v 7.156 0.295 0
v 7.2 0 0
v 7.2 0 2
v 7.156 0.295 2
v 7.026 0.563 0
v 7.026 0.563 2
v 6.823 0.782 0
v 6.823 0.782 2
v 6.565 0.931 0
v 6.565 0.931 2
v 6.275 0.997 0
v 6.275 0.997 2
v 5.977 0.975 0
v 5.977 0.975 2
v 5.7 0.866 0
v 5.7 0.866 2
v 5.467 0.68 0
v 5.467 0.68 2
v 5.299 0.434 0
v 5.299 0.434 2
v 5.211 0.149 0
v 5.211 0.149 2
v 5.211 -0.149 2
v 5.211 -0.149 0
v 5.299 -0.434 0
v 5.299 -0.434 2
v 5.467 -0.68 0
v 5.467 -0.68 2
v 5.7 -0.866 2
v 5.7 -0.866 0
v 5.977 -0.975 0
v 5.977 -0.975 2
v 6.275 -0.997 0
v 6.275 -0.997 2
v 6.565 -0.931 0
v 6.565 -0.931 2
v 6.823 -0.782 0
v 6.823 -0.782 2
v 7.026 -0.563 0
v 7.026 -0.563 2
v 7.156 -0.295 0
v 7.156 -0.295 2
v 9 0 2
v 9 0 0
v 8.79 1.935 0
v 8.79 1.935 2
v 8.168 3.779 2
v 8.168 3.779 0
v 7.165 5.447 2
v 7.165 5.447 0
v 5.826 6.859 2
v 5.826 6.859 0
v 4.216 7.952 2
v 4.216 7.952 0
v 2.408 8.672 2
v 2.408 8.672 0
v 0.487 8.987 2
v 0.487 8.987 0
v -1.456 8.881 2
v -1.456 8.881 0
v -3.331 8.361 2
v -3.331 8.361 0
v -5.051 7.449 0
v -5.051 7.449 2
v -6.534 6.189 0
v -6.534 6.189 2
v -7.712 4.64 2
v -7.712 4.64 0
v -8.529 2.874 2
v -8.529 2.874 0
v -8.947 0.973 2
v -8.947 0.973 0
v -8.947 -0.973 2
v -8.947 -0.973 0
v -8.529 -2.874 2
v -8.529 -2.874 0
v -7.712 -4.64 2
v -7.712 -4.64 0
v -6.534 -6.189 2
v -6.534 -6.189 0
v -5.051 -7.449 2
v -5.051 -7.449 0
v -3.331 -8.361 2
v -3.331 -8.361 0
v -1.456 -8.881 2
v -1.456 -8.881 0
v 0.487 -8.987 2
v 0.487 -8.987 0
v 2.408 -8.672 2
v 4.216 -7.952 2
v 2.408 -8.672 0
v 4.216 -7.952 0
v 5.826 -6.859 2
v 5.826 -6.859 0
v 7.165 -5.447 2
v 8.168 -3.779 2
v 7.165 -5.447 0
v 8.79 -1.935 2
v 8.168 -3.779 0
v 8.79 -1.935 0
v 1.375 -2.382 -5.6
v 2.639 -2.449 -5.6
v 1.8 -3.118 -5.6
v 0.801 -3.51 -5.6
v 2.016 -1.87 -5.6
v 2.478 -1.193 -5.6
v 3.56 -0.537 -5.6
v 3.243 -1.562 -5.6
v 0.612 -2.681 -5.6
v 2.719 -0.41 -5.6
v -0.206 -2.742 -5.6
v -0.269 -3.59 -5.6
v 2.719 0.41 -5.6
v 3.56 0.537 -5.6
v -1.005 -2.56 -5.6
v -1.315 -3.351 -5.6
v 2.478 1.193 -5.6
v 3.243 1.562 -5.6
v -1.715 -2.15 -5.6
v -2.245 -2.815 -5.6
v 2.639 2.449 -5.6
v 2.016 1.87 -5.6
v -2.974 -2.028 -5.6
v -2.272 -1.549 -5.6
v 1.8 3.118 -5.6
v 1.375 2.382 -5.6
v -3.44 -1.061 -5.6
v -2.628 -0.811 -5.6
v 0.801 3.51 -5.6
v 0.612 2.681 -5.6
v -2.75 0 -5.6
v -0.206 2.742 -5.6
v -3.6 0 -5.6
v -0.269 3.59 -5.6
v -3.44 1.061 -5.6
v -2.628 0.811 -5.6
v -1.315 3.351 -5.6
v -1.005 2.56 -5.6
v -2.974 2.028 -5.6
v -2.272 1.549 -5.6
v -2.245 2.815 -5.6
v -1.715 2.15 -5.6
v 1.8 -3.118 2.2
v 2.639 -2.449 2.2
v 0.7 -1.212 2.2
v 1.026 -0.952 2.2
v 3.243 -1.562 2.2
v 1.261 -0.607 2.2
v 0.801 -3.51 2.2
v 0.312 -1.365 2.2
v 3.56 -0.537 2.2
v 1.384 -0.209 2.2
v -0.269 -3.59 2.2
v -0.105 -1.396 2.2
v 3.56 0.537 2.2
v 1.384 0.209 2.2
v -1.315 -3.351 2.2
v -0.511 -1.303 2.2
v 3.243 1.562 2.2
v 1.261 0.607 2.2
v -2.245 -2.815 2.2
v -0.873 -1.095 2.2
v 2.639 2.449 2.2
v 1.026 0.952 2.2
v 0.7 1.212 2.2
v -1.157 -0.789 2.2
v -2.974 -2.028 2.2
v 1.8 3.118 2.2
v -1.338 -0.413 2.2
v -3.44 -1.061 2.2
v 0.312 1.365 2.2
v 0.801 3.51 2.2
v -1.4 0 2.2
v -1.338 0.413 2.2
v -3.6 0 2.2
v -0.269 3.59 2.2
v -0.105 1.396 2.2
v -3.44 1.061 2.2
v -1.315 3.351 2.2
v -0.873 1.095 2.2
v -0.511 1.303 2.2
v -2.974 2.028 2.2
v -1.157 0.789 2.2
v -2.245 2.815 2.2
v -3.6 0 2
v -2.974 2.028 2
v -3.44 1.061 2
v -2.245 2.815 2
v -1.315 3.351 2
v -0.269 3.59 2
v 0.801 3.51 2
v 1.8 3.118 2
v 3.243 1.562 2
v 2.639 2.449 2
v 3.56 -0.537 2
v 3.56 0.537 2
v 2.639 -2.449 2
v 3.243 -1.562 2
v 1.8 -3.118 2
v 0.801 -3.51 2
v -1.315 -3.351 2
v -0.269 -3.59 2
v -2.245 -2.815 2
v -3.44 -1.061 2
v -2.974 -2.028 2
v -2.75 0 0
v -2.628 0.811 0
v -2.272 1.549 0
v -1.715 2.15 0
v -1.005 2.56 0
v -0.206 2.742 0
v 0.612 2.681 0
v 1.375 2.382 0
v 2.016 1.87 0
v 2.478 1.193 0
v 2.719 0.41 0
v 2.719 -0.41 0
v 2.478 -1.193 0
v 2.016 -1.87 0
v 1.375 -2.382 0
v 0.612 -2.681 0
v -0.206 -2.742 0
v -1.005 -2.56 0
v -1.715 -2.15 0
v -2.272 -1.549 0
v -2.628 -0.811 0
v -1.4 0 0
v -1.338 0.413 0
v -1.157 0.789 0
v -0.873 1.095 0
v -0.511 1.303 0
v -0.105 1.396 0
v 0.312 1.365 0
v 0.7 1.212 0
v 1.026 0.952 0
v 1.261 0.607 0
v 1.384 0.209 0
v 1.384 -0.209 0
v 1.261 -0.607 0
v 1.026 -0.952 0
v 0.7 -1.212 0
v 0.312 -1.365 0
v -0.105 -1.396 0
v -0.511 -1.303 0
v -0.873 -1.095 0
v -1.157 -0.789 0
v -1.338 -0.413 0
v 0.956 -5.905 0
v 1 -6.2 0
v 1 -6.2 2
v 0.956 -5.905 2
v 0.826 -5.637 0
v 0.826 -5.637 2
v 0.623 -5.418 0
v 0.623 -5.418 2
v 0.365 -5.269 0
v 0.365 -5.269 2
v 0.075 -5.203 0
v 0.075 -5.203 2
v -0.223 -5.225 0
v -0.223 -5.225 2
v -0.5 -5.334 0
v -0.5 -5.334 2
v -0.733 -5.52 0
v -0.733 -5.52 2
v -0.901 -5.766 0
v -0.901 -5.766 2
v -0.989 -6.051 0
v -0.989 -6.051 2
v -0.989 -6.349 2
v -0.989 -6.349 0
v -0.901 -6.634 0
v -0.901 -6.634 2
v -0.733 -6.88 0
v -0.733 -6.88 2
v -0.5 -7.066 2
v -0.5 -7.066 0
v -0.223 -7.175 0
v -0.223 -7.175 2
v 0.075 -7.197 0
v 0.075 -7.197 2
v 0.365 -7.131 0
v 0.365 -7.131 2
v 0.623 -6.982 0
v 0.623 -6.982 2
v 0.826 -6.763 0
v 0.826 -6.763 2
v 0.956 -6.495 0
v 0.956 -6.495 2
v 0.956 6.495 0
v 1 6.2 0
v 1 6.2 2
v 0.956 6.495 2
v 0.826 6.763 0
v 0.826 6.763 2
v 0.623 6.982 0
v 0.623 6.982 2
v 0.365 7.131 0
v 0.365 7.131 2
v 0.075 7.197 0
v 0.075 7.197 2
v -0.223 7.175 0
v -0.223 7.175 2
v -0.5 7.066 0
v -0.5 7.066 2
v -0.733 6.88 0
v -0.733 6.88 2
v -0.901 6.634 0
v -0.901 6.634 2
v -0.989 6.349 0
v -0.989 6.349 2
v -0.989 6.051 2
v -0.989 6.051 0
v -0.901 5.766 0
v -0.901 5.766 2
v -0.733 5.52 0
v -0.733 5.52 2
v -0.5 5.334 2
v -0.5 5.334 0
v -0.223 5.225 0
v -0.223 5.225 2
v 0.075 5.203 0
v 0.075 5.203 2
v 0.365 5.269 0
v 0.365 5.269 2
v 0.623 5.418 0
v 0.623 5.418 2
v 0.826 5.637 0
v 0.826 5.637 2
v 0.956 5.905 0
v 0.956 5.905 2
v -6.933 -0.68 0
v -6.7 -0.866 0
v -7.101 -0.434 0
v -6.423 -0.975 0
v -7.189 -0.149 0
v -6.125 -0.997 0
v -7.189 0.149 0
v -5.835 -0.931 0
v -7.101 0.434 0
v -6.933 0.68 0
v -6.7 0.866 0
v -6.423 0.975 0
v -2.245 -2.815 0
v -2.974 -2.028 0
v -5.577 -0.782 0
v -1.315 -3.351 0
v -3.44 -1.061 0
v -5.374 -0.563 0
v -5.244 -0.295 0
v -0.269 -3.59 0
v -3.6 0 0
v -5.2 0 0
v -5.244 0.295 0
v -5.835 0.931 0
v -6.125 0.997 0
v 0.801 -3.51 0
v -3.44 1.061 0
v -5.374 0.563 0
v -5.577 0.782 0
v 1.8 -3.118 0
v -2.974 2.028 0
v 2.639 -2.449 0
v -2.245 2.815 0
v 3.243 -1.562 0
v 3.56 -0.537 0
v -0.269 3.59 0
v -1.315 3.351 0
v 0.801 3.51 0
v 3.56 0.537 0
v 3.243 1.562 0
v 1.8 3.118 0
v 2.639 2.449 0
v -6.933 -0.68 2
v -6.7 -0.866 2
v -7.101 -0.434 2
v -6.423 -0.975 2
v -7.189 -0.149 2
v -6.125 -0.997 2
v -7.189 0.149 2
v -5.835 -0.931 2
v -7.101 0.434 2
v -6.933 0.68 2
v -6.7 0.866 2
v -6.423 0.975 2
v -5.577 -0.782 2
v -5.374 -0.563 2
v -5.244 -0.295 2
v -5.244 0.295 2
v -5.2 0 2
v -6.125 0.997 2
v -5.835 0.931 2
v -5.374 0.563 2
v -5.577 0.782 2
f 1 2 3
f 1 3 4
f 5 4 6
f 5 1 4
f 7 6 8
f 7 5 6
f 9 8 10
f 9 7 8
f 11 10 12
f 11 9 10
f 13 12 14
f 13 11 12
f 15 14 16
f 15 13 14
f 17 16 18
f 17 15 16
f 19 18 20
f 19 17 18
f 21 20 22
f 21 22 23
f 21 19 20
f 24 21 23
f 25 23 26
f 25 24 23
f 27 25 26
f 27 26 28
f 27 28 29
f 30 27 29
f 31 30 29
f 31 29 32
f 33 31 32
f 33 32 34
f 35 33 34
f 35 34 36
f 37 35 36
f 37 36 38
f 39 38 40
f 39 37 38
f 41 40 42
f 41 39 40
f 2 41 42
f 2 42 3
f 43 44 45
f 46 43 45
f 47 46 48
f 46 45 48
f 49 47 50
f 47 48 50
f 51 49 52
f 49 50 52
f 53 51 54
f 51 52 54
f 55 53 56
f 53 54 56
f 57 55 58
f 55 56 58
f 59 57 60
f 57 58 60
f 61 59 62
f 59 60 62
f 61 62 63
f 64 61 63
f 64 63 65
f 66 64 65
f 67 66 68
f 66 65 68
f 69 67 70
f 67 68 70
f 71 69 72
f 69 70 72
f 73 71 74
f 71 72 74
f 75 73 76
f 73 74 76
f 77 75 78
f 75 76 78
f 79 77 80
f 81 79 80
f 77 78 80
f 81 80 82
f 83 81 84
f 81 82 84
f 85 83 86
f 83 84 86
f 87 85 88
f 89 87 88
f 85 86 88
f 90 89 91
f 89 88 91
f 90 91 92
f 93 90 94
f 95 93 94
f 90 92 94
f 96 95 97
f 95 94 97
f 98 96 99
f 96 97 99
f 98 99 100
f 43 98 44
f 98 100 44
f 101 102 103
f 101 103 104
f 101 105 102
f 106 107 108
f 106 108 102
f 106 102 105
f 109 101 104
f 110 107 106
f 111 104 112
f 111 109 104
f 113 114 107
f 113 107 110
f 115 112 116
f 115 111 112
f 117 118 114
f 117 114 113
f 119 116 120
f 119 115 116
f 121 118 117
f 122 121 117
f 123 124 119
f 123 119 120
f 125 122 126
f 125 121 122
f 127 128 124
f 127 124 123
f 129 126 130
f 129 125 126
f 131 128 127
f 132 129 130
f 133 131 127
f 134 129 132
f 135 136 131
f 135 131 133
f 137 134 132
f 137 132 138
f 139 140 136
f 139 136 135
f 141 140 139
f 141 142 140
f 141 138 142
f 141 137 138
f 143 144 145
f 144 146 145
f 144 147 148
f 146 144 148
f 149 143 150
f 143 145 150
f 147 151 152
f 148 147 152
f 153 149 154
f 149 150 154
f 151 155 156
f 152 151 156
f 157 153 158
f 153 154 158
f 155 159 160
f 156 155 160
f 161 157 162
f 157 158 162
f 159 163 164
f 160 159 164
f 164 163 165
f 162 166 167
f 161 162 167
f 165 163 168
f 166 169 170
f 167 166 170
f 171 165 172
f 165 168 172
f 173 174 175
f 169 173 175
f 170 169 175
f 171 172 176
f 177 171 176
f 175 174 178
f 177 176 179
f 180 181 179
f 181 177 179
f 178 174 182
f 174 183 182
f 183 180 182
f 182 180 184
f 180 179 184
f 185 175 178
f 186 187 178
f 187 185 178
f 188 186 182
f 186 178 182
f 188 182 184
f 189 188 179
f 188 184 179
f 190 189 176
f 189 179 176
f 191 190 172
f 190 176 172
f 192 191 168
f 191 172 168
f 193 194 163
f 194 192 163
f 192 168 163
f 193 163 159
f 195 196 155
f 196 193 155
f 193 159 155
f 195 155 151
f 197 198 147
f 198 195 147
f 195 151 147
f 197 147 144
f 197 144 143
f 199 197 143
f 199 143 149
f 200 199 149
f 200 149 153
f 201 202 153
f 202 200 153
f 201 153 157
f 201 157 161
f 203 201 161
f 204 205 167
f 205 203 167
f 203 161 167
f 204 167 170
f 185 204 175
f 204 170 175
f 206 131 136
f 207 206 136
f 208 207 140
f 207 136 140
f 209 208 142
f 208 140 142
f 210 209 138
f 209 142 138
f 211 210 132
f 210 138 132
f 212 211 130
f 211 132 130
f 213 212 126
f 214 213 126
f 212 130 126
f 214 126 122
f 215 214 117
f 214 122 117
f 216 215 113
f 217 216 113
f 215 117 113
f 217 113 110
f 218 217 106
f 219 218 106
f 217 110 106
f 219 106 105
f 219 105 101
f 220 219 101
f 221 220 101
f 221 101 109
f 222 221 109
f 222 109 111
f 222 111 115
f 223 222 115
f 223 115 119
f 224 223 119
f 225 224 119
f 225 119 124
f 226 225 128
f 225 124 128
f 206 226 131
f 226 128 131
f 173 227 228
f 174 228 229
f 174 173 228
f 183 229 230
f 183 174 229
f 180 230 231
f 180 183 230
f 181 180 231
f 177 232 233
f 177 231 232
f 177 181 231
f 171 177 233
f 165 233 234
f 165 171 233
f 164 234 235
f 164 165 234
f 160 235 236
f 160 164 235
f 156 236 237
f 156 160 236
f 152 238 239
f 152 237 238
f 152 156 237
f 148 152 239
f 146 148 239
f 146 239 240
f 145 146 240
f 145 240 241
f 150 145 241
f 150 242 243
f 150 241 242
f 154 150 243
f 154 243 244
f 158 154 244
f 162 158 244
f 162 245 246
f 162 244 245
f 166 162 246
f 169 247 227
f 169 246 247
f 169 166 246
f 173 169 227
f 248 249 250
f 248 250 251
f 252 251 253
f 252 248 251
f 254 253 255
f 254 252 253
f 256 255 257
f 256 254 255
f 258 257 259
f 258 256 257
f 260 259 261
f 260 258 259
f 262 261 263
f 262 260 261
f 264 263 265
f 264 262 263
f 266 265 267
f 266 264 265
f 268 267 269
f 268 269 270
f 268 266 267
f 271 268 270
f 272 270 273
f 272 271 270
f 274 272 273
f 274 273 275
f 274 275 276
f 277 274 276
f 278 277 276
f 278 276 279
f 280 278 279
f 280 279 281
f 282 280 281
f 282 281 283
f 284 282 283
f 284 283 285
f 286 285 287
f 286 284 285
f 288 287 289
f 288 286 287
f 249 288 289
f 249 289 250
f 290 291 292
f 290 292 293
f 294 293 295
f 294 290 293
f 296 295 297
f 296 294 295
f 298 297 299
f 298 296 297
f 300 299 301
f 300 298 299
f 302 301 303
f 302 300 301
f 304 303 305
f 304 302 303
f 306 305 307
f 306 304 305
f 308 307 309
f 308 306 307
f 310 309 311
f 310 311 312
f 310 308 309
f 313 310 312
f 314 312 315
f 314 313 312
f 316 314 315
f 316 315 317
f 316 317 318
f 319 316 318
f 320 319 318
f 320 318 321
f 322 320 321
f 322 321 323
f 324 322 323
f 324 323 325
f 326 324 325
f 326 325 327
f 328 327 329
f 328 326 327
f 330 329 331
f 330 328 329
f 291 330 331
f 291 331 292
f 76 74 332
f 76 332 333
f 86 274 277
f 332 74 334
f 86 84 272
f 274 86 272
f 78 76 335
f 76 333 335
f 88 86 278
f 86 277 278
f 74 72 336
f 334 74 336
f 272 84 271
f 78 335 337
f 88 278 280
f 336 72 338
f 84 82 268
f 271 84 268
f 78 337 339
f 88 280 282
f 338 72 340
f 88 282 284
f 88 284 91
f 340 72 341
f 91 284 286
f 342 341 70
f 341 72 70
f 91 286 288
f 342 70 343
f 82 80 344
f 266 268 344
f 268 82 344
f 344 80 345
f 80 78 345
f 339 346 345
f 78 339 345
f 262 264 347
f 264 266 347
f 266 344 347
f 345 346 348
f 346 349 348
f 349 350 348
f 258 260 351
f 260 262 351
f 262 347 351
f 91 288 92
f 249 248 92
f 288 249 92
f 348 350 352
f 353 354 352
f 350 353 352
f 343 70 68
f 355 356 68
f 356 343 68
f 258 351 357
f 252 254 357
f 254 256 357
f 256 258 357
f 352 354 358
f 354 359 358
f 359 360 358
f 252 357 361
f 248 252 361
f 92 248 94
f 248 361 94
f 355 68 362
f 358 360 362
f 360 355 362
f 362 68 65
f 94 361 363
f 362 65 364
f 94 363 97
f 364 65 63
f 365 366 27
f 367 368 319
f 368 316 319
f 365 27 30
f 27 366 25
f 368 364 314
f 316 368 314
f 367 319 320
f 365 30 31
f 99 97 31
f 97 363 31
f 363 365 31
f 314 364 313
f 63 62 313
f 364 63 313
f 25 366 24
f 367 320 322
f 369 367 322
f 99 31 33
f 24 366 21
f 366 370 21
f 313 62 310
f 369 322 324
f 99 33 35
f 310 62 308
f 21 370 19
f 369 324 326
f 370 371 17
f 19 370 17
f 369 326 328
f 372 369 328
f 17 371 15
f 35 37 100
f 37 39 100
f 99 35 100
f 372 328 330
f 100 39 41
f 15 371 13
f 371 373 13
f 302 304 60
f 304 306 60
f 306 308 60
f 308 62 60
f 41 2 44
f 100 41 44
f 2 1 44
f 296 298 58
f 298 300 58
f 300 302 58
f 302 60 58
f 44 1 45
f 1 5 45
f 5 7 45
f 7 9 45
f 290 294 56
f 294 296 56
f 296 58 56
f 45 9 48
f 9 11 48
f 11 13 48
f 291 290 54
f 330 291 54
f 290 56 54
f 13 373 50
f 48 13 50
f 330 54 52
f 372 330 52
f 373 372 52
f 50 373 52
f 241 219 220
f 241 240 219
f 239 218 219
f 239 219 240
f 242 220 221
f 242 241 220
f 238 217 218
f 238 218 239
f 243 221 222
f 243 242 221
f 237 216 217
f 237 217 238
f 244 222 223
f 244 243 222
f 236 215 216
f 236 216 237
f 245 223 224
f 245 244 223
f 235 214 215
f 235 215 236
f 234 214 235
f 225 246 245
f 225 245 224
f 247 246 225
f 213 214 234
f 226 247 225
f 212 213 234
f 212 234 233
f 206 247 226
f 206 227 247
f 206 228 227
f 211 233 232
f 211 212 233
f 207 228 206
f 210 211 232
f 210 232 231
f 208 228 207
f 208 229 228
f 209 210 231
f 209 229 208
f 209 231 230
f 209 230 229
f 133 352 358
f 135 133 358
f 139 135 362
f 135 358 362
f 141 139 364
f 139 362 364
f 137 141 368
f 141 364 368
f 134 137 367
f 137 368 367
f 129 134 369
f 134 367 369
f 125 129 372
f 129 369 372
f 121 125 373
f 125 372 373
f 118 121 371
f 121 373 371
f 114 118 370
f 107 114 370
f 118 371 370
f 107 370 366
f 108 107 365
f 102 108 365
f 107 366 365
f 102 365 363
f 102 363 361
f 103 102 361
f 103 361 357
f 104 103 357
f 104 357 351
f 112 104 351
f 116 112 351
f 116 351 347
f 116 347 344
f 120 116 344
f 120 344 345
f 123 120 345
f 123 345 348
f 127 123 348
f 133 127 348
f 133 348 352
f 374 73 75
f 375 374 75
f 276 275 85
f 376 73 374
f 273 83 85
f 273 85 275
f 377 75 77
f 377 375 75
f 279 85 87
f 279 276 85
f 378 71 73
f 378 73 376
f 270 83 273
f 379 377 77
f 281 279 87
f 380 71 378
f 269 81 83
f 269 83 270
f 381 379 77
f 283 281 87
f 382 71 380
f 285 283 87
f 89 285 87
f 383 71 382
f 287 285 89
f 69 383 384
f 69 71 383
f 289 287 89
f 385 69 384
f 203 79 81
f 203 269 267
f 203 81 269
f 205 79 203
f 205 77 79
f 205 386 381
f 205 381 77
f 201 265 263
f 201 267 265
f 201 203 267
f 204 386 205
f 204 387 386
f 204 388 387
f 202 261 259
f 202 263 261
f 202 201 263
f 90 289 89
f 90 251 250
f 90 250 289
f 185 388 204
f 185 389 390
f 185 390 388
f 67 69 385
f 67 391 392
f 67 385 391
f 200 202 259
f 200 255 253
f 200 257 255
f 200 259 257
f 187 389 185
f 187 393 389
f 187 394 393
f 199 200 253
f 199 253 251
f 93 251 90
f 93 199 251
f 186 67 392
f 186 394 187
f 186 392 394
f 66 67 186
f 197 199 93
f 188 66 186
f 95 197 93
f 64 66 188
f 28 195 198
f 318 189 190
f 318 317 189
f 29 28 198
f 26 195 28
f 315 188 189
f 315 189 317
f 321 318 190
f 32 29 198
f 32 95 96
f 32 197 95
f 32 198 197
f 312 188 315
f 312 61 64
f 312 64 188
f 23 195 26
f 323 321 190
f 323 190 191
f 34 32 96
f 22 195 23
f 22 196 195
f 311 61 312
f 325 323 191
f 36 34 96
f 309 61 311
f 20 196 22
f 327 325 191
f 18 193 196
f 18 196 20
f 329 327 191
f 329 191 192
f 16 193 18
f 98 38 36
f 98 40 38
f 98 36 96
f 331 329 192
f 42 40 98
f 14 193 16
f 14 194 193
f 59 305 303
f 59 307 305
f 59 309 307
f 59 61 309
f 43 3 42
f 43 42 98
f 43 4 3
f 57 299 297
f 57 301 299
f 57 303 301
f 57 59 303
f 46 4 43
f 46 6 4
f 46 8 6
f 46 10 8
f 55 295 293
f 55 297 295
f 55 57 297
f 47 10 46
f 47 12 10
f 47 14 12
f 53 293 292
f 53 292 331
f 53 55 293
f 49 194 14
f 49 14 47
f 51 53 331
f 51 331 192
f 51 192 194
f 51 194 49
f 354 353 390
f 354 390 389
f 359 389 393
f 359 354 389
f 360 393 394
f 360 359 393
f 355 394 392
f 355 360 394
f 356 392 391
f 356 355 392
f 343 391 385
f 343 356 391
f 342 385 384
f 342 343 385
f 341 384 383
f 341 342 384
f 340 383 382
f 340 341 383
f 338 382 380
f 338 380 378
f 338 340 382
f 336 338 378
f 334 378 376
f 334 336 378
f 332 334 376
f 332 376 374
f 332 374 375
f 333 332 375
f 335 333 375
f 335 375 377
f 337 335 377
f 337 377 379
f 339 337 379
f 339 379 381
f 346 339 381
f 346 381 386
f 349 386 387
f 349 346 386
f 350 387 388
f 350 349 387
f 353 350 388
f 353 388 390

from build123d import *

# Parameters (mm, degrees)
SKETCH1_R                = 9
SKETCH1_R_2              = 3.4
SKETCH1_R_3              = 1
BOSS_EXTRUDE1_DEPTH      = 2
BOSS_EXTRUDE2_DEPTH      = 5.6
BOSS_EXTRUDE2_DEPTH_BACK = 2.2
SKETCH2_R                = 3.6
SKETCH2_R_2              = 1.4
SKETCH3_R                = 2.75
CUT_EXTRUDE1_DEPTH       = 5.6


with BuildPart() as part:
    # Sketch1 → Boss-Extrude1 (new body)
    with BuildSketch(Plane.XY):
        Circle(SKETCH1_R)
        Circle(SKETCH1_R_2, mode=Mode.SUBTRACT)
        with Locations((0, 6.2)):
            Circle(SKETCH1_R_3, mode=Mode.SUBTRACT)
        with Locations((6.2, 0)):
            Circle(SKETCH1_R_3, mode=Mode.SUBTRACT)
        with Locations((0, -6.2)):
            Circle(SKETCH1_R_3, mode=Mode.SUBTRACT)
        with Locations((-6.2, 0)):
            Circle(SKETCH1_R_3, mode=Mode.SUBTRACT)
    extrude(amount=BOSS_EXTRUDE1_DEPTH)

    # Sketch2 → Boss-Extrude2 (add, two sides: drawn at the far end of the back side and taken through both)
    with BuildSketch(Plane(origin=(0, 0, 0), x_dir=(-1, 0, 0), z_dir=(0, 0, -1)).offset(-BOSS_EXTRUDE2_DEPTH_BACK)):
        Circle(SKETCH2_R)
        Circle(SKETCH2_R_2, mode=Mode.SUBTRACT)
    extrude(amount=BOSS_EXTRUDE2_DEPTH + BOSS_EXTRUDE2_DEPTH_BACK)

    # Sketch3 → Cut-Extrude1 (cut)
    with BuildSketch(Plane(origin=(0, 0, -5.6), x_dir=(-1, 0, 0), z_dir=(0, 0, -1))):
        Circle(SKETCH3_R)
    extrude(amount=-CUT_EXTRUDE1_DEPTH, mode=Mode.SUBTRACT)


solid = part.part
